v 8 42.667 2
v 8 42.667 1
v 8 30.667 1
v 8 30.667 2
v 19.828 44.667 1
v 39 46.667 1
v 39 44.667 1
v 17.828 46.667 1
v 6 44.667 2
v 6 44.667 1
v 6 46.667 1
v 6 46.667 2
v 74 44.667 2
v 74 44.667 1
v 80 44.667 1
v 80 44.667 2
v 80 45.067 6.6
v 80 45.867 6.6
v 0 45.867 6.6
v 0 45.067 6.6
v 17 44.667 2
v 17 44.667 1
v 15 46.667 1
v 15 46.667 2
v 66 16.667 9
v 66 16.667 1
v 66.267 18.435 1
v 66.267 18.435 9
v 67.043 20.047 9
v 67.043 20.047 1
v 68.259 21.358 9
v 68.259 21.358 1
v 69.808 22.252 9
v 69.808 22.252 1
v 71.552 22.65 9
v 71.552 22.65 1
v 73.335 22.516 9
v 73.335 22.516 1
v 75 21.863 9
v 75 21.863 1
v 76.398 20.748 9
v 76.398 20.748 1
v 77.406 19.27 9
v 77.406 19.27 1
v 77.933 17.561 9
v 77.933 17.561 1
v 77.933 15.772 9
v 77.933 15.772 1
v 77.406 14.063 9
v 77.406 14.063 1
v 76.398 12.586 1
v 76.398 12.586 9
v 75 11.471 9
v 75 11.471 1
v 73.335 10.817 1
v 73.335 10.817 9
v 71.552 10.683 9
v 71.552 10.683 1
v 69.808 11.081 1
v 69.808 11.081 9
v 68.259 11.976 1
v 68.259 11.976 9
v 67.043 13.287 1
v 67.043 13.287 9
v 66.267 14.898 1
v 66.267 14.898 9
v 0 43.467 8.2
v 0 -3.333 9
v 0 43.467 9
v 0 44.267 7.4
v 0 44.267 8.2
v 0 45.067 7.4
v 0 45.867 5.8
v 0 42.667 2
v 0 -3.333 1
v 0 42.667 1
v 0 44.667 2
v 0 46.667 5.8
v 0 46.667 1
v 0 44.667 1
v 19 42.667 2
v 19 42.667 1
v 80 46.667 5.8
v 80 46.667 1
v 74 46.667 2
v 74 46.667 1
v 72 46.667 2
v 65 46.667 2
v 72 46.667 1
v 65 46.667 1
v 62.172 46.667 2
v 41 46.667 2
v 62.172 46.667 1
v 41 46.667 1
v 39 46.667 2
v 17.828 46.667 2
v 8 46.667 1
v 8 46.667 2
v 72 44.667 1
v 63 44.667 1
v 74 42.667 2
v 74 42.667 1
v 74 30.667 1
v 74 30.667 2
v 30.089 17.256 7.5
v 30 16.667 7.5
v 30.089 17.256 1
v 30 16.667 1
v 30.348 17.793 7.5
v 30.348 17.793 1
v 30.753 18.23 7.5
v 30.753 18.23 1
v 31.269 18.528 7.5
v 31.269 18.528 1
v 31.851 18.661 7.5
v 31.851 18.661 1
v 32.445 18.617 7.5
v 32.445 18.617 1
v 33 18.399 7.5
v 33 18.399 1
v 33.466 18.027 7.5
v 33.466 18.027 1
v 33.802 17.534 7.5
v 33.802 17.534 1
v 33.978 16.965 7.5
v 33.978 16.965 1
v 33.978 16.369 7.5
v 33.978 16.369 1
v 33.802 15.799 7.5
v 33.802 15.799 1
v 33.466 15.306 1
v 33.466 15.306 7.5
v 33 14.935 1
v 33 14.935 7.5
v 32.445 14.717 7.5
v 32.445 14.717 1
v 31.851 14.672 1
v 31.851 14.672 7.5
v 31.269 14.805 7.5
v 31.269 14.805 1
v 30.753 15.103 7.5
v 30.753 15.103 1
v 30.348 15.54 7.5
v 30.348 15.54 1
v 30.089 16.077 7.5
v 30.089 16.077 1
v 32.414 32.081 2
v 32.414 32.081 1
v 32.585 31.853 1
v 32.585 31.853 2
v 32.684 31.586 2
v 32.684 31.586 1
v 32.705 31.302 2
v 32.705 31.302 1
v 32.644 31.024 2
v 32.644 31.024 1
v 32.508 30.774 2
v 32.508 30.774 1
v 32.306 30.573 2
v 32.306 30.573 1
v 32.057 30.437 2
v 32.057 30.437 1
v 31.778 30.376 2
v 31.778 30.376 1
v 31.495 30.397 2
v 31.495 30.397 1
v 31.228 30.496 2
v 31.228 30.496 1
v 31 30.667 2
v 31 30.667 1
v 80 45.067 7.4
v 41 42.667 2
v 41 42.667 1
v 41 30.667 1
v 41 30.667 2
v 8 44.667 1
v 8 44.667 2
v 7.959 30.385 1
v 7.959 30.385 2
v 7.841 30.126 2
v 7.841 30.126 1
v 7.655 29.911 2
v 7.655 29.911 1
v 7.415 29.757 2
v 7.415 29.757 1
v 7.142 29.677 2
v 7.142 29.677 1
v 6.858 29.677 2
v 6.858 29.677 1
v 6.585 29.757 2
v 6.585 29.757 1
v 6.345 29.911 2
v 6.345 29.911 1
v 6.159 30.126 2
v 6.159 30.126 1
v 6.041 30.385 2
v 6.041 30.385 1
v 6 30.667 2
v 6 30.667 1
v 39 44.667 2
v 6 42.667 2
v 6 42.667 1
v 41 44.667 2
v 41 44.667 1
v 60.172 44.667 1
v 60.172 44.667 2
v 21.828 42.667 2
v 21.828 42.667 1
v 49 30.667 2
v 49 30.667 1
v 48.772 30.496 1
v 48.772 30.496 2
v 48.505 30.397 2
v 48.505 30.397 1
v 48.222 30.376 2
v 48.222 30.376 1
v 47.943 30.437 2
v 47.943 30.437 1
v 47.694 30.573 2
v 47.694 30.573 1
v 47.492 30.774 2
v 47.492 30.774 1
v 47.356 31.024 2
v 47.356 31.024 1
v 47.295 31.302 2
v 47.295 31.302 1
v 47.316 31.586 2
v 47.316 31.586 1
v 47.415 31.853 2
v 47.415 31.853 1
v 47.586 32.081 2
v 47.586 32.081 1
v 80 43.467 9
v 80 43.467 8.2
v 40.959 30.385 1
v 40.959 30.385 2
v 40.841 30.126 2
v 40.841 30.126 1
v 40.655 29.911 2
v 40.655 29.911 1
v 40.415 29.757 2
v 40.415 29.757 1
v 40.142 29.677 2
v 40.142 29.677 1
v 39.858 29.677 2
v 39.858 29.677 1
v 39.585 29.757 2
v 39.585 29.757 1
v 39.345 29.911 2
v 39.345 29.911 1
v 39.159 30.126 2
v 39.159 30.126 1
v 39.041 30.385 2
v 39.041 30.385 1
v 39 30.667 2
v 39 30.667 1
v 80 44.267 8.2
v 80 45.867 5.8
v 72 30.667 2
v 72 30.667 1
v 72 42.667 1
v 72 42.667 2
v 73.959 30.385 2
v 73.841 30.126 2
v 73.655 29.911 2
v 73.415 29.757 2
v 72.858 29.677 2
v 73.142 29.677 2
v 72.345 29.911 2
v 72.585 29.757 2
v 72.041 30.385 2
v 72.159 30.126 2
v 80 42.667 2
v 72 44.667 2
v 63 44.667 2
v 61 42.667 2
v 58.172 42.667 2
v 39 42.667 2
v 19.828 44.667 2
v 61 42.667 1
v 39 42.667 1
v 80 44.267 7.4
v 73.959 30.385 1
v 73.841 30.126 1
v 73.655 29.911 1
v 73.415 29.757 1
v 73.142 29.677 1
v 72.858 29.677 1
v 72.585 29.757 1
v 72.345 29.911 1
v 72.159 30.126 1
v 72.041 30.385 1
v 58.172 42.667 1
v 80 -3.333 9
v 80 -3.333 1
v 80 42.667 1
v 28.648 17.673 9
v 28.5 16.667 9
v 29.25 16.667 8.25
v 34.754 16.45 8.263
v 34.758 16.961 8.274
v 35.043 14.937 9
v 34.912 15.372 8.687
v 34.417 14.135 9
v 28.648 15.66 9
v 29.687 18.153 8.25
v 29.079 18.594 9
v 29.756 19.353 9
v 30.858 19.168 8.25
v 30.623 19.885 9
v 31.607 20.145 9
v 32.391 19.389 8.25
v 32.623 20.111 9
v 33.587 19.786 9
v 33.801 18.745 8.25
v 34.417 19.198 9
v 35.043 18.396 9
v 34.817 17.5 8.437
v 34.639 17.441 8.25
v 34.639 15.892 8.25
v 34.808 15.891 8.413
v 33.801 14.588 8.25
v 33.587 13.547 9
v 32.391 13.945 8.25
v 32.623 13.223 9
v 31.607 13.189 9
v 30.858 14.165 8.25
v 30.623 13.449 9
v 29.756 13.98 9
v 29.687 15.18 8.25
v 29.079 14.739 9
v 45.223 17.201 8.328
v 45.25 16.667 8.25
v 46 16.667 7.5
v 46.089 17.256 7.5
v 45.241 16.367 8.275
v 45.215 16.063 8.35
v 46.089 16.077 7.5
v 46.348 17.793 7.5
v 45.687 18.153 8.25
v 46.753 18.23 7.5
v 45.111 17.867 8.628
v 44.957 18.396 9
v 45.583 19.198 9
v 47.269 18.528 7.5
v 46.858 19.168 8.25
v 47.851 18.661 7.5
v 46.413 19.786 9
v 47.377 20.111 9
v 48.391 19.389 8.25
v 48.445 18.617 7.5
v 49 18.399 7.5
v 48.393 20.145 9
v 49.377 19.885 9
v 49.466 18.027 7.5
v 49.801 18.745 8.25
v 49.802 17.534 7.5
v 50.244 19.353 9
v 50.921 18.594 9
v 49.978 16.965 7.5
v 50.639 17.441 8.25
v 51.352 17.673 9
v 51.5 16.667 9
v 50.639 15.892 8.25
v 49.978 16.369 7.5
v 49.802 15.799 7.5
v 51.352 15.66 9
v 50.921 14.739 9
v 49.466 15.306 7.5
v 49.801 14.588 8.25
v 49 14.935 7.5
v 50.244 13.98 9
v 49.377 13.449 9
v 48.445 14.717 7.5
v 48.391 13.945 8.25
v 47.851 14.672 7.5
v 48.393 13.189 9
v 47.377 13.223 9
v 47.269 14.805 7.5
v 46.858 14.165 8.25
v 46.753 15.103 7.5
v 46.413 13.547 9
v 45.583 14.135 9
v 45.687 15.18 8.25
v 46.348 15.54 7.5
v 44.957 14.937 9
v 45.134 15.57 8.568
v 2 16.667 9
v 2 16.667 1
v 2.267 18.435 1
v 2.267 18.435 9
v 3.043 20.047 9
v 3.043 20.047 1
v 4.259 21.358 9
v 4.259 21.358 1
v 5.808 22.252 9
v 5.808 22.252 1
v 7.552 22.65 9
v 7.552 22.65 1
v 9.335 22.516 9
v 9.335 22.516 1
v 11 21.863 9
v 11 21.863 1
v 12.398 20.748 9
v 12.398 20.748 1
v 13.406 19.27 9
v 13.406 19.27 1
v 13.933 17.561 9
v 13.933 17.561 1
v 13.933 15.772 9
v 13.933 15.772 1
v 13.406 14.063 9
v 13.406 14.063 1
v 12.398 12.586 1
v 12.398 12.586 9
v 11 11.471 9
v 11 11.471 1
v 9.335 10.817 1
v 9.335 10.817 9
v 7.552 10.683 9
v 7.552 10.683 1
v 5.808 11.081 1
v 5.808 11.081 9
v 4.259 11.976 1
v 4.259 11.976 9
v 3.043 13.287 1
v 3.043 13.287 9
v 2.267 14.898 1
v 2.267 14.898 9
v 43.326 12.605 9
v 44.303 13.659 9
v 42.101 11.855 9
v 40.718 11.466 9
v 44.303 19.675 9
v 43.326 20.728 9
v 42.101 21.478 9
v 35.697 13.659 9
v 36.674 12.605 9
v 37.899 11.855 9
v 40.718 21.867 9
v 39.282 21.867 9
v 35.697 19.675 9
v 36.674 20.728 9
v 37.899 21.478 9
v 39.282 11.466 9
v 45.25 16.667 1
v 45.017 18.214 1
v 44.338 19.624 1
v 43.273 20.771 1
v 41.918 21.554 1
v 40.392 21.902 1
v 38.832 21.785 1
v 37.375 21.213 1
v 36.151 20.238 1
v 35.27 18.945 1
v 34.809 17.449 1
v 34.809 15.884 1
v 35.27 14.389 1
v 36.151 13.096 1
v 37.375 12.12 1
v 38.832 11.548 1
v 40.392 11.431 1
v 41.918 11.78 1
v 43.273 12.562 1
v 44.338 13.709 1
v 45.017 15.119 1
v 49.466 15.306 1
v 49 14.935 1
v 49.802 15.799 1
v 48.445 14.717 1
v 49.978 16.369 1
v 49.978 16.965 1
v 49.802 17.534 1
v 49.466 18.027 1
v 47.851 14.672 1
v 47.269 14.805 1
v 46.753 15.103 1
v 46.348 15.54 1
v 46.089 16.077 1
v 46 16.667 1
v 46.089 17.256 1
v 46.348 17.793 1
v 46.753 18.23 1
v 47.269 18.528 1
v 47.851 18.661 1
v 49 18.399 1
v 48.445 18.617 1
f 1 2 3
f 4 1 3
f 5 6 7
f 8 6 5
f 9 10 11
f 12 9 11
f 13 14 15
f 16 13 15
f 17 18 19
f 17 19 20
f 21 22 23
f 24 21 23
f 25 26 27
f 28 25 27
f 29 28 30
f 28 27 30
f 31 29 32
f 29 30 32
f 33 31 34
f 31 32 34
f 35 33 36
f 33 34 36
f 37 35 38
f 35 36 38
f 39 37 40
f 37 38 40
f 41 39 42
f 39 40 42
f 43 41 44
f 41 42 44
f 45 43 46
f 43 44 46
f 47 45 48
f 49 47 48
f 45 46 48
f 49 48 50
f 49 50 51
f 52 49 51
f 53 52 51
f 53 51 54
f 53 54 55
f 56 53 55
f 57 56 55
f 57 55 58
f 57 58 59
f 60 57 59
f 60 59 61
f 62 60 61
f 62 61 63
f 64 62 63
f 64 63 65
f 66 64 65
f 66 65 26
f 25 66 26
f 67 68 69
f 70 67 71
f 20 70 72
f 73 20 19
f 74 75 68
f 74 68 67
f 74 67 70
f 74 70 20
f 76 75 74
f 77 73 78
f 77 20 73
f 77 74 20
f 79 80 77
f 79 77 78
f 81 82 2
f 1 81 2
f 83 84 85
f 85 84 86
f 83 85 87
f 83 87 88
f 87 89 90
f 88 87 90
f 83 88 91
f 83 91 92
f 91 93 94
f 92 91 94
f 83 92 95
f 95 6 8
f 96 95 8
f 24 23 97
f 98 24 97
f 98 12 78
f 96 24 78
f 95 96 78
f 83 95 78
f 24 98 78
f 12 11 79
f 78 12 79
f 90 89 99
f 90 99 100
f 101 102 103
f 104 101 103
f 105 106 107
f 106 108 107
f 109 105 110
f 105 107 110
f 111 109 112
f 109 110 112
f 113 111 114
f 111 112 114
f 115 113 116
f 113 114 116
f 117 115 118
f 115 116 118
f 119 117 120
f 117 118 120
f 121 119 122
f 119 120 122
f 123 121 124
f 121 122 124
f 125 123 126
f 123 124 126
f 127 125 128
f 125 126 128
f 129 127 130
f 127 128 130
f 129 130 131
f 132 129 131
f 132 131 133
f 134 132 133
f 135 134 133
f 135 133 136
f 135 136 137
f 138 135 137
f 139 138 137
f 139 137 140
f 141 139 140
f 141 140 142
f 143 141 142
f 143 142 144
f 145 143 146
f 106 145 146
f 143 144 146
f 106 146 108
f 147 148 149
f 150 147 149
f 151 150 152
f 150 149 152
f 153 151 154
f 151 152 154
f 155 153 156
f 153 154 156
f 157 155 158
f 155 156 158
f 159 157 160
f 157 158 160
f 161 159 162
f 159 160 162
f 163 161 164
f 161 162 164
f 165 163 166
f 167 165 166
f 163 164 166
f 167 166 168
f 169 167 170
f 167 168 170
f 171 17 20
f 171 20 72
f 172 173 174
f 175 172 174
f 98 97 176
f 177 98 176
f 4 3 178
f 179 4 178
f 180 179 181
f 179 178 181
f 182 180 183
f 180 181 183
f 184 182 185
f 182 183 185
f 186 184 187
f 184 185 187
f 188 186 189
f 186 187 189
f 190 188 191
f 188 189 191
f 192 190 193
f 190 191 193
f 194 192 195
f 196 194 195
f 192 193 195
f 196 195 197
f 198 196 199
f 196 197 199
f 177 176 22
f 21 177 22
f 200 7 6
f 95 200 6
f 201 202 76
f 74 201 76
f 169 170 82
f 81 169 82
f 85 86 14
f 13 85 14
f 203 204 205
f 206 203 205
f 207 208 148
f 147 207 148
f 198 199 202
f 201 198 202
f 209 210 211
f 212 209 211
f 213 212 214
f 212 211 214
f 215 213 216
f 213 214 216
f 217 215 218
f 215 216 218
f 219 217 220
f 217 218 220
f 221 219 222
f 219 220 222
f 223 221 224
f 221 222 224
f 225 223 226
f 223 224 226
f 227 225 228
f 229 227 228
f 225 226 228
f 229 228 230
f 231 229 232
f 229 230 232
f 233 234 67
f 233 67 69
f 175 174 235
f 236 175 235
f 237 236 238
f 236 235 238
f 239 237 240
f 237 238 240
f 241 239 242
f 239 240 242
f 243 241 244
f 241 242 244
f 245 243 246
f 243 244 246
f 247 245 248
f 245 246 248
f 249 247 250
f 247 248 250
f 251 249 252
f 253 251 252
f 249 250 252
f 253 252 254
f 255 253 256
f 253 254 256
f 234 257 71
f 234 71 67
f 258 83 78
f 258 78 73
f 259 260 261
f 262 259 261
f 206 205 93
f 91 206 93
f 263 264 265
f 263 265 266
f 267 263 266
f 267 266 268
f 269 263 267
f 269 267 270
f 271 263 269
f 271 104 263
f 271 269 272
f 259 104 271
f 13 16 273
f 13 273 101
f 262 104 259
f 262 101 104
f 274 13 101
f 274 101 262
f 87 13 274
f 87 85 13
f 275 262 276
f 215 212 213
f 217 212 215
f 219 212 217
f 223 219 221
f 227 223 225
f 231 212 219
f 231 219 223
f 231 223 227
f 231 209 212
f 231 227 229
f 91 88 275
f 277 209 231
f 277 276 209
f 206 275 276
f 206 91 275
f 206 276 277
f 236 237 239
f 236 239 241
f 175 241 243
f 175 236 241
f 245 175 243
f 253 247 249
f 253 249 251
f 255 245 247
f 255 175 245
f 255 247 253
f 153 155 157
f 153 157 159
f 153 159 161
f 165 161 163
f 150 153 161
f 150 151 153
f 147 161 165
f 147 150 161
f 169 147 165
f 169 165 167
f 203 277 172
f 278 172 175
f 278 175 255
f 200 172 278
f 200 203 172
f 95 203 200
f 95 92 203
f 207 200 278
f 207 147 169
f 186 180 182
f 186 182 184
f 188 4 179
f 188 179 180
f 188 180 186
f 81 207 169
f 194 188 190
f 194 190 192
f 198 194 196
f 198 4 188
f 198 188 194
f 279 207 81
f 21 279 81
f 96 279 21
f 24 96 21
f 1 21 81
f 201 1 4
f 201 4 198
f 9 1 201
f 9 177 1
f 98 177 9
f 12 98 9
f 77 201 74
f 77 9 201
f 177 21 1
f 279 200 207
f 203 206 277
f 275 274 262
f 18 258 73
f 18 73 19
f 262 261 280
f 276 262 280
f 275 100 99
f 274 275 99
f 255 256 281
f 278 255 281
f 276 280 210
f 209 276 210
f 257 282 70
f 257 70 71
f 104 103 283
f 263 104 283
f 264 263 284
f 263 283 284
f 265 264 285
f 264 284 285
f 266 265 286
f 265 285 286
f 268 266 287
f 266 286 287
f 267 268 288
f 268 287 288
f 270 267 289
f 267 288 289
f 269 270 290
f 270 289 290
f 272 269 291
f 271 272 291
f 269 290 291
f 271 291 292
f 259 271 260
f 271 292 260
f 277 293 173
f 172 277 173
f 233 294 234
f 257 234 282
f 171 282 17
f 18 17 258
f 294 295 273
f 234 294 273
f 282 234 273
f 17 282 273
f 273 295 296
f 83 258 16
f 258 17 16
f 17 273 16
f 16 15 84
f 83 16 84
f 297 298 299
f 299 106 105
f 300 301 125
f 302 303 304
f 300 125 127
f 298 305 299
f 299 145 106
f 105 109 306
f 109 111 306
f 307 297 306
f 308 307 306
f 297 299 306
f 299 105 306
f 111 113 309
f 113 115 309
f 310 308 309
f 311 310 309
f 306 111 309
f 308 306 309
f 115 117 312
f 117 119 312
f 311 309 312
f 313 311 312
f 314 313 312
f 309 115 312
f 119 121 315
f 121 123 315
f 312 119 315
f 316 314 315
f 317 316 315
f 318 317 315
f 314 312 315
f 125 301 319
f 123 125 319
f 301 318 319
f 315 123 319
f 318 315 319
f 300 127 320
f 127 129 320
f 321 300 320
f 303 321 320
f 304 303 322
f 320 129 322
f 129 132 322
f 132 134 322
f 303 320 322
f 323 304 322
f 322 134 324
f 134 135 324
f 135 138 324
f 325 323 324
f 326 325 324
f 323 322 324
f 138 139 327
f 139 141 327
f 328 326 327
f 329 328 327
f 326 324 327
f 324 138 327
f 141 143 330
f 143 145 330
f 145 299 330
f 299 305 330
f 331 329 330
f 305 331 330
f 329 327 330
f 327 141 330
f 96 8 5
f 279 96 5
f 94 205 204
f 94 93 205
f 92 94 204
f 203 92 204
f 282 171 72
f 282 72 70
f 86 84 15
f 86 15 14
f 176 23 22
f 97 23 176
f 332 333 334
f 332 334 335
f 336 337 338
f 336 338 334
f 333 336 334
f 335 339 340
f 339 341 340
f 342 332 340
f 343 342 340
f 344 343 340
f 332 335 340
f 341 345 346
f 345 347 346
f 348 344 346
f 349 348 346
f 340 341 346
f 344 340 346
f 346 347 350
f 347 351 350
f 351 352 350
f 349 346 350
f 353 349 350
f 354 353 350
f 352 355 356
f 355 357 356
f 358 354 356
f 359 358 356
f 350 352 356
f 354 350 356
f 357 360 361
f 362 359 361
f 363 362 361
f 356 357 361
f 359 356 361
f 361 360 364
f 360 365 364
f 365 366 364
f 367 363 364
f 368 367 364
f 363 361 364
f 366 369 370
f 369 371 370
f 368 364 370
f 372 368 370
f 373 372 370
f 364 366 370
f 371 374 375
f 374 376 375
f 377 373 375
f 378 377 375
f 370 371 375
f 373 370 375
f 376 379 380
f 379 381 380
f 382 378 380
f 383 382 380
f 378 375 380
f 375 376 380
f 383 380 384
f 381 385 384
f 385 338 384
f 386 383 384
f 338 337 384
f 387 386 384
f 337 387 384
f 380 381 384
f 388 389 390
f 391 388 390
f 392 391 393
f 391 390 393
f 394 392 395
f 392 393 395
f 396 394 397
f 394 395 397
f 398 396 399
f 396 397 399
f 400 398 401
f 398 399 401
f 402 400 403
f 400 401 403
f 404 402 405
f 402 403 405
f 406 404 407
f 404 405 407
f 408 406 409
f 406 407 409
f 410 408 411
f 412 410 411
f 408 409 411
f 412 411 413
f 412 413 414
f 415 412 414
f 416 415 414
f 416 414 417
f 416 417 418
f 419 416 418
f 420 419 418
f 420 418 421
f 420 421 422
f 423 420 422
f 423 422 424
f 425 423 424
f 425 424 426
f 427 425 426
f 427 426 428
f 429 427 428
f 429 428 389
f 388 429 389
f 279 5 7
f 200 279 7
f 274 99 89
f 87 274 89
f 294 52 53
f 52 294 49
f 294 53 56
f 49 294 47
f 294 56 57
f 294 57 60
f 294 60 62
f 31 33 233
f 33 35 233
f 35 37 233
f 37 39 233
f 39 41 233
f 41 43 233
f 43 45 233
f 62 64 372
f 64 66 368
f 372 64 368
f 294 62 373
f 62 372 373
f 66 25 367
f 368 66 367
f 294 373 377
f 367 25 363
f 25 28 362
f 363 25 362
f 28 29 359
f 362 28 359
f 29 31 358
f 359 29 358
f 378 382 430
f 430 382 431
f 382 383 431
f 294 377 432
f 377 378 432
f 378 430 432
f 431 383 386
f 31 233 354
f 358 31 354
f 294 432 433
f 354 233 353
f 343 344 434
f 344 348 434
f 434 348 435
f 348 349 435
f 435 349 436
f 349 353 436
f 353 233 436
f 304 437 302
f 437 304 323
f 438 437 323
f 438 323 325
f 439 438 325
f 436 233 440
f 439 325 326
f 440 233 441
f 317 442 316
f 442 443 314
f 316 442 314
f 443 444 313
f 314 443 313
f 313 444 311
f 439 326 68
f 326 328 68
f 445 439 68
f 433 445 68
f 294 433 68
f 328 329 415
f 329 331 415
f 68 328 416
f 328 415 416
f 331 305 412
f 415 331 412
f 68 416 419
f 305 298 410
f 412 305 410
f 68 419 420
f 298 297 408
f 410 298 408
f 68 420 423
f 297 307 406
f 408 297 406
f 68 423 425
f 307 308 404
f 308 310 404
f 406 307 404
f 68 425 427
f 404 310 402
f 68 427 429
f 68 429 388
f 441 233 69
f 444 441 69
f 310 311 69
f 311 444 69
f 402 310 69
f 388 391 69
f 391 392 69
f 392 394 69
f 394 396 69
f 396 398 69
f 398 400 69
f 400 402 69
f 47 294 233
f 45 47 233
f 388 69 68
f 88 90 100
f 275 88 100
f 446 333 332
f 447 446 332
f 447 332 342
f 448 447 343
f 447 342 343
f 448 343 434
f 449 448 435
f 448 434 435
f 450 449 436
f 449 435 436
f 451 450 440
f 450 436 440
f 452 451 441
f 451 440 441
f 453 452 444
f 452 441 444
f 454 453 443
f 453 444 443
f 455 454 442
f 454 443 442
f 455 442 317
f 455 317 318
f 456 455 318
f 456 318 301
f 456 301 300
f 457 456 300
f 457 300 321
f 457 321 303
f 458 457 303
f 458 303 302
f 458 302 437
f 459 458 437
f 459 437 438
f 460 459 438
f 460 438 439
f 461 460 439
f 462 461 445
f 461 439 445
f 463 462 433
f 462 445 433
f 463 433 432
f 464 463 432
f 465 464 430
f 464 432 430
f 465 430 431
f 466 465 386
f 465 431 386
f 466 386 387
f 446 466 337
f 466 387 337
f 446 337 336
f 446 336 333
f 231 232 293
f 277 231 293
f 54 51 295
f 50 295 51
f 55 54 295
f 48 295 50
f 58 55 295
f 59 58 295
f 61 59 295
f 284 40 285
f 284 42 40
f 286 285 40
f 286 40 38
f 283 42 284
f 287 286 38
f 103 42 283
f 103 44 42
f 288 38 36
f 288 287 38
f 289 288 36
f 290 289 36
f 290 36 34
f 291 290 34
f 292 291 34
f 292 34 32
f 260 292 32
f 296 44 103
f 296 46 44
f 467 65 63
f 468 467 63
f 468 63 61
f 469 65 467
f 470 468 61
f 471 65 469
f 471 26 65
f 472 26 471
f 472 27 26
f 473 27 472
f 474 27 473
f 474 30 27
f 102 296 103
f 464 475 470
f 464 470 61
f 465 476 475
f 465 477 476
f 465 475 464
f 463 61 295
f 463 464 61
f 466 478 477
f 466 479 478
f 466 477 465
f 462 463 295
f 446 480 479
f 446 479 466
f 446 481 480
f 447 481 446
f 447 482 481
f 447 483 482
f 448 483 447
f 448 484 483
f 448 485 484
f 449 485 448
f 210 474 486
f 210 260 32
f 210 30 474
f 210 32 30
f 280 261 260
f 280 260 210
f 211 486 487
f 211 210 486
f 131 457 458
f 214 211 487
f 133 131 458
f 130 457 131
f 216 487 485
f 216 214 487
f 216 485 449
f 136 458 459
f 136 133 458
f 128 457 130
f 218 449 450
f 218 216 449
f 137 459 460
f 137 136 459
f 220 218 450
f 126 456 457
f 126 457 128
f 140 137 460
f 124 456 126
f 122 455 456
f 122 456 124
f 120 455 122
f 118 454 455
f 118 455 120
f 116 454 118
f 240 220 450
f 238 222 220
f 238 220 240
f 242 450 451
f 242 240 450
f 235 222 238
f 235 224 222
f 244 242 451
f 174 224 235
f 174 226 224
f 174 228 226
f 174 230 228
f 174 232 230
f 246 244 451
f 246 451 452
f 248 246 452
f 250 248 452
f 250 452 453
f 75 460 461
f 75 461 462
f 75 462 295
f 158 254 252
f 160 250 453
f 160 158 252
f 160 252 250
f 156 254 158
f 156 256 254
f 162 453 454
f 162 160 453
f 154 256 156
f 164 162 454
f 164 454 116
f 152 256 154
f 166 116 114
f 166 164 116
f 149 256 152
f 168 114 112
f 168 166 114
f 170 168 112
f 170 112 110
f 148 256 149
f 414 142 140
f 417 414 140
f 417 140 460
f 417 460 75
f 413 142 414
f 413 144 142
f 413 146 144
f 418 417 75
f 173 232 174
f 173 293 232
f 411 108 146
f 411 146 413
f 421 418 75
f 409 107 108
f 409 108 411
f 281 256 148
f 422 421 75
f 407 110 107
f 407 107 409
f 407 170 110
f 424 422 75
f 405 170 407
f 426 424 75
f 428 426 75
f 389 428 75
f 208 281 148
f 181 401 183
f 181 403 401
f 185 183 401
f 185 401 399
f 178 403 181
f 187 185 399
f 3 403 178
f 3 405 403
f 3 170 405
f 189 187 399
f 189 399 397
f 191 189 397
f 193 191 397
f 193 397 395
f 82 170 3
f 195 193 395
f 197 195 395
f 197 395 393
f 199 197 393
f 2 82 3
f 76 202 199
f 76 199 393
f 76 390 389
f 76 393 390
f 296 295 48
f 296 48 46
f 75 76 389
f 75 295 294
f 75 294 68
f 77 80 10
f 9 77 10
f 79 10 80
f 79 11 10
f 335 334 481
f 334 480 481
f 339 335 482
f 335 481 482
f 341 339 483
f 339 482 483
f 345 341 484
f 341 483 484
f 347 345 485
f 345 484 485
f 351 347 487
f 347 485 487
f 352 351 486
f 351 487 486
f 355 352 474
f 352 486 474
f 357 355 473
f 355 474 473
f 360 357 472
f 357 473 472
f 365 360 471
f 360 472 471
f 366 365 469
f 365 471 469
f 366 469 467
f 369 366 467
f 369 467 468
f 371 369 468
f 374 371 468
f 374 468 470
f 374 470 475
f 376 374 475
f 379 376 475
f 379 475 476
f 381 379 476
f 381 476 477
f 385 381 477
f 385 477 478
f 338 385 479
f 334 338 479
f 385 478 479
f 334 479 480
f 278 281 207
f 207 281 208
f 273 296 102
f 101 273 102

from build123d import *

# Parameters (mm, degrees)
SKETCH_1_W                     = 80
SKETCH_1_H                     = 60
EXTRUDE_1_DEPTH                = 8
HOLE_WIZARD_12_0_12_1_D        = 12
HOLE_WIZARD_10_5_10_5_1_D      = 10.5
HOLE_WIZARD_M3_5_1_D           = 4
HOLE_WIZARD_M3_5_1_CSINK_D     = 7
HOLE_WIZARD_M3_5_1_CSINK_ANGLE = 90
CUT_EXTRUDE_1_DEPTH            = 1
CUT_EXTRUDE_2_REACH            = 95.053
CUT_EXTRUDE_3_REACH            = 94.961
SKETCH_29_W                    = 80
SKETCH_29_H                    = 10


with BuildPart() as part:
    # 草图1 → 凸台-拉伸1 (new body)
    with BuildSketch(Plane(origin=(0, 0, 1), x_dir=(-1, 0, 0), z_dir=(0, 0, -1))):
        with Locations((-40, 16.666666667)):
            Rectangle(SKETCH_1_W, SKETCH_1_H)
    extrude(amount=-EXTRUDE_1_DEPTH)

    # Ø12.0 (12) 直径孔1 (through all)
    with Locations(Plane.XY.offset(9)):
        with Locations((72, 16.666666667), (8, 16.666666667)):
            Hole(HOLE_WIZARD_12_0_12_1_D / 2)

    # Ø10.5 (10.5) 直径孔1 (through all)
    with Locations(Plane(origin=(0, 0, 1), x_dir=(-1, 0, 0), z_dir=(0, 0, -1))):
        with Locations((-40, 16.666666667)):
            Hole(HOLE_WIZARD_10_5_10_5_1_D / 2)

    # M3.5 平头机械螺钉的锥形沉头孔1 (through all)
    with Locations(Plane.XY.offset(9)):
        with Locations((32, 16.666666667), (48, 16.666666667)):
            CounterSinkHole(HOLE_WIZARD_M3_5_1_D / 2, HOLE_WIZARD_M3_5_1_CSINK_D / 2, counter_sink_angle=HOLE_WIZARD_M3_5_1_CSINK_ANGLE)

    # 草图27 → 切除-拉伸1 (cut)
    with BuildSketch(Plane(origin=(0, 0, 1), x_dir=(-1, 0, 0), z_dir=(0, 0, -1))):
        with BuildLine():
            ThreePointArc((-41, 30.666666667), (-40, 29.666666667), (-39, 30.666666667))
            Line((-39, 30.666666667), (-39, 42.666666667))
            Line((-39, 42.666666667), (-21.828427125, 42.666666667))
            Line((-21.828427125, 42.666666667), (-32.414213562, 32.080880229))
            ThreePointArc((-32.414213562, 32.080880229), (-32.414213562, 30.666666667), (-31, 30.666666667))
            Line((-31, 30.666666667), (-19, 42.666666667))
            Line((-19, 42.666666667), (-8, 42.666666667))
            Line((-8, 42.666666667), (-8, 30.666666667))
            ThreePointArc((-8, 30.666666667), (-7, 29.666666667), (-6, 30.666666667))
            Line((-6, 30.666666667), (-6, 42.666666667))
            Line((-6, 42.666666667), (0, 42.666666667))
            Line((0, 42.666666667), (0, 44.666666667))
            Line((0, 44.666666667), (-6, 44.666666667))
            Line((-6, 44.666666667), (-6, 46.666666667))
            Line((-6, 46.666666667), (-8, 46.666666667))
            Line((-8, 46.666666667), (-8, 44.666666667))
            Line((-8, 44.666666667), (-17, 44.666666667))
            Line((-17, 44.666666667), (-15, 46.666666667))
            Line((-15, 46.666666667), (-16.414213562, 48.080880229))
            Line((-16.414213562, 48.080880229), (-19.828427125, 44.666666667))
            Line((-19.828427125, 44.666666667), (-39, 44.666666667))
            Line((-39, 44.666666667), (-39, 46.666666667))
            Line((-39, 46.666666667), (-41, 46.666666667))
            Line((-41, 46.666666667), (-41, 44.666666667))
            Line((-41, 44.666666667), (-60.171572875, 44.666666667))
            Line((-60.171572875, 44.666666667), (-63.585786438, 48.080880229))
            Line((-63.585786438, 48.080880229), (-65, 46.666666667))
            Line((-65, 46.666666667), (-63, 44.666666667))
            Line((-63, 44.666666667), (-72, 44.666666667))
            Line((-72, 44.666666667), (-72, 46.666666667))
            Line((-72, 46.666666667), (-74, 46.666666667))
            Line((-74, 46.666666667), (-74, 44.666666667))
            Line((-74, 44.666666667), (-80, 44.666666667))
            Line((-80, 44.666666667), (-80, 42.666666667))
            Line((-80, 42.666666667), (-74, 42.666666667))
            Line((-74, 42.666666667), (-74, 30.666666667))
            ThreePointArc((-74, 30.666666667), (-73, 29.666666667), (-72, 30.666666667))
            Line((-72, 30.666666667), (-72, 42.666666667))
            Line((-72, 42.666666667), (-61, 42.666666667))
            Line((-61, 42.666666667), (-49, 30.666666667))
            ThreePointArc((-49, 30.666666667), (-47.585786438, 30.666666667), (-47.585786438, 32.080880229))
            Line((-47.585786438, 32.080880229), (-58.171572875, 42.666666667))
            Line((-58.171572875, 42.666666667), (-41, 42.666666667))
            Line((-41, 42.666666667), (-41, 30.666666667))
        make_face()
    extrude(amount=-CUT_EXTRUDE_1_DEPTH, mode=Mode.SUBTRACT)

    # 草图28 → 切除-拉伸2 (cut, up to next)
    with BuildSketch(Plane.ZY, mode=Mode.PRIVATE) as cut_extrude_2_sk1:
        Polygon((9, 46.666666667), (5.8, 46.666666667), (5.8, 45.866666667), (6.6, 45.866666667), (6.6, 45.066666667), (7.4, 45.066666667), (7.4, 44.266666667), (8.2, 44.266666667), (8.2, 43.466666667), (9, 43.466666667), align=None)
    cut_extrude_2_tool1 = extrude(cut_extrude_2_sk1.sketch, amount=-CUT_EXTRUDE_2_REACH, mode=Mode.PRIVATE) & part.part
    add(cut_extrude_2_tool1.solids().sort_by_distance((0, 45.466667, 7.8))[0], mode=Mode.SUBTRACT)

    # 草图29 → 切除-拉伸3 (cut, up to next)
    with BuildSketch(Plane(origin=(0, 0, 1), x_dir=(-1, 0, 0), z_dir=(0, 0, -1)), mode=Mode.PRIVATE) as cut_extrude_3_sk1:
        with Locations((-40, -8.333333333)):
            Rectangle(SKETCH_29_W, SKETCH_29_H)
    cut_extrude_3_tool1 = extrude(cut_extrude_3_sk1.sketch, amount=-CUT_EXTRUDE_3_REACH, mode=Mode.PRIVATE) & part.part
    add(cut_extrude_3_tool1.solids().sort_by_distance((40, -8.333333, 1))[0], mode=Mode.SUBTRACT)


solid = part.part
